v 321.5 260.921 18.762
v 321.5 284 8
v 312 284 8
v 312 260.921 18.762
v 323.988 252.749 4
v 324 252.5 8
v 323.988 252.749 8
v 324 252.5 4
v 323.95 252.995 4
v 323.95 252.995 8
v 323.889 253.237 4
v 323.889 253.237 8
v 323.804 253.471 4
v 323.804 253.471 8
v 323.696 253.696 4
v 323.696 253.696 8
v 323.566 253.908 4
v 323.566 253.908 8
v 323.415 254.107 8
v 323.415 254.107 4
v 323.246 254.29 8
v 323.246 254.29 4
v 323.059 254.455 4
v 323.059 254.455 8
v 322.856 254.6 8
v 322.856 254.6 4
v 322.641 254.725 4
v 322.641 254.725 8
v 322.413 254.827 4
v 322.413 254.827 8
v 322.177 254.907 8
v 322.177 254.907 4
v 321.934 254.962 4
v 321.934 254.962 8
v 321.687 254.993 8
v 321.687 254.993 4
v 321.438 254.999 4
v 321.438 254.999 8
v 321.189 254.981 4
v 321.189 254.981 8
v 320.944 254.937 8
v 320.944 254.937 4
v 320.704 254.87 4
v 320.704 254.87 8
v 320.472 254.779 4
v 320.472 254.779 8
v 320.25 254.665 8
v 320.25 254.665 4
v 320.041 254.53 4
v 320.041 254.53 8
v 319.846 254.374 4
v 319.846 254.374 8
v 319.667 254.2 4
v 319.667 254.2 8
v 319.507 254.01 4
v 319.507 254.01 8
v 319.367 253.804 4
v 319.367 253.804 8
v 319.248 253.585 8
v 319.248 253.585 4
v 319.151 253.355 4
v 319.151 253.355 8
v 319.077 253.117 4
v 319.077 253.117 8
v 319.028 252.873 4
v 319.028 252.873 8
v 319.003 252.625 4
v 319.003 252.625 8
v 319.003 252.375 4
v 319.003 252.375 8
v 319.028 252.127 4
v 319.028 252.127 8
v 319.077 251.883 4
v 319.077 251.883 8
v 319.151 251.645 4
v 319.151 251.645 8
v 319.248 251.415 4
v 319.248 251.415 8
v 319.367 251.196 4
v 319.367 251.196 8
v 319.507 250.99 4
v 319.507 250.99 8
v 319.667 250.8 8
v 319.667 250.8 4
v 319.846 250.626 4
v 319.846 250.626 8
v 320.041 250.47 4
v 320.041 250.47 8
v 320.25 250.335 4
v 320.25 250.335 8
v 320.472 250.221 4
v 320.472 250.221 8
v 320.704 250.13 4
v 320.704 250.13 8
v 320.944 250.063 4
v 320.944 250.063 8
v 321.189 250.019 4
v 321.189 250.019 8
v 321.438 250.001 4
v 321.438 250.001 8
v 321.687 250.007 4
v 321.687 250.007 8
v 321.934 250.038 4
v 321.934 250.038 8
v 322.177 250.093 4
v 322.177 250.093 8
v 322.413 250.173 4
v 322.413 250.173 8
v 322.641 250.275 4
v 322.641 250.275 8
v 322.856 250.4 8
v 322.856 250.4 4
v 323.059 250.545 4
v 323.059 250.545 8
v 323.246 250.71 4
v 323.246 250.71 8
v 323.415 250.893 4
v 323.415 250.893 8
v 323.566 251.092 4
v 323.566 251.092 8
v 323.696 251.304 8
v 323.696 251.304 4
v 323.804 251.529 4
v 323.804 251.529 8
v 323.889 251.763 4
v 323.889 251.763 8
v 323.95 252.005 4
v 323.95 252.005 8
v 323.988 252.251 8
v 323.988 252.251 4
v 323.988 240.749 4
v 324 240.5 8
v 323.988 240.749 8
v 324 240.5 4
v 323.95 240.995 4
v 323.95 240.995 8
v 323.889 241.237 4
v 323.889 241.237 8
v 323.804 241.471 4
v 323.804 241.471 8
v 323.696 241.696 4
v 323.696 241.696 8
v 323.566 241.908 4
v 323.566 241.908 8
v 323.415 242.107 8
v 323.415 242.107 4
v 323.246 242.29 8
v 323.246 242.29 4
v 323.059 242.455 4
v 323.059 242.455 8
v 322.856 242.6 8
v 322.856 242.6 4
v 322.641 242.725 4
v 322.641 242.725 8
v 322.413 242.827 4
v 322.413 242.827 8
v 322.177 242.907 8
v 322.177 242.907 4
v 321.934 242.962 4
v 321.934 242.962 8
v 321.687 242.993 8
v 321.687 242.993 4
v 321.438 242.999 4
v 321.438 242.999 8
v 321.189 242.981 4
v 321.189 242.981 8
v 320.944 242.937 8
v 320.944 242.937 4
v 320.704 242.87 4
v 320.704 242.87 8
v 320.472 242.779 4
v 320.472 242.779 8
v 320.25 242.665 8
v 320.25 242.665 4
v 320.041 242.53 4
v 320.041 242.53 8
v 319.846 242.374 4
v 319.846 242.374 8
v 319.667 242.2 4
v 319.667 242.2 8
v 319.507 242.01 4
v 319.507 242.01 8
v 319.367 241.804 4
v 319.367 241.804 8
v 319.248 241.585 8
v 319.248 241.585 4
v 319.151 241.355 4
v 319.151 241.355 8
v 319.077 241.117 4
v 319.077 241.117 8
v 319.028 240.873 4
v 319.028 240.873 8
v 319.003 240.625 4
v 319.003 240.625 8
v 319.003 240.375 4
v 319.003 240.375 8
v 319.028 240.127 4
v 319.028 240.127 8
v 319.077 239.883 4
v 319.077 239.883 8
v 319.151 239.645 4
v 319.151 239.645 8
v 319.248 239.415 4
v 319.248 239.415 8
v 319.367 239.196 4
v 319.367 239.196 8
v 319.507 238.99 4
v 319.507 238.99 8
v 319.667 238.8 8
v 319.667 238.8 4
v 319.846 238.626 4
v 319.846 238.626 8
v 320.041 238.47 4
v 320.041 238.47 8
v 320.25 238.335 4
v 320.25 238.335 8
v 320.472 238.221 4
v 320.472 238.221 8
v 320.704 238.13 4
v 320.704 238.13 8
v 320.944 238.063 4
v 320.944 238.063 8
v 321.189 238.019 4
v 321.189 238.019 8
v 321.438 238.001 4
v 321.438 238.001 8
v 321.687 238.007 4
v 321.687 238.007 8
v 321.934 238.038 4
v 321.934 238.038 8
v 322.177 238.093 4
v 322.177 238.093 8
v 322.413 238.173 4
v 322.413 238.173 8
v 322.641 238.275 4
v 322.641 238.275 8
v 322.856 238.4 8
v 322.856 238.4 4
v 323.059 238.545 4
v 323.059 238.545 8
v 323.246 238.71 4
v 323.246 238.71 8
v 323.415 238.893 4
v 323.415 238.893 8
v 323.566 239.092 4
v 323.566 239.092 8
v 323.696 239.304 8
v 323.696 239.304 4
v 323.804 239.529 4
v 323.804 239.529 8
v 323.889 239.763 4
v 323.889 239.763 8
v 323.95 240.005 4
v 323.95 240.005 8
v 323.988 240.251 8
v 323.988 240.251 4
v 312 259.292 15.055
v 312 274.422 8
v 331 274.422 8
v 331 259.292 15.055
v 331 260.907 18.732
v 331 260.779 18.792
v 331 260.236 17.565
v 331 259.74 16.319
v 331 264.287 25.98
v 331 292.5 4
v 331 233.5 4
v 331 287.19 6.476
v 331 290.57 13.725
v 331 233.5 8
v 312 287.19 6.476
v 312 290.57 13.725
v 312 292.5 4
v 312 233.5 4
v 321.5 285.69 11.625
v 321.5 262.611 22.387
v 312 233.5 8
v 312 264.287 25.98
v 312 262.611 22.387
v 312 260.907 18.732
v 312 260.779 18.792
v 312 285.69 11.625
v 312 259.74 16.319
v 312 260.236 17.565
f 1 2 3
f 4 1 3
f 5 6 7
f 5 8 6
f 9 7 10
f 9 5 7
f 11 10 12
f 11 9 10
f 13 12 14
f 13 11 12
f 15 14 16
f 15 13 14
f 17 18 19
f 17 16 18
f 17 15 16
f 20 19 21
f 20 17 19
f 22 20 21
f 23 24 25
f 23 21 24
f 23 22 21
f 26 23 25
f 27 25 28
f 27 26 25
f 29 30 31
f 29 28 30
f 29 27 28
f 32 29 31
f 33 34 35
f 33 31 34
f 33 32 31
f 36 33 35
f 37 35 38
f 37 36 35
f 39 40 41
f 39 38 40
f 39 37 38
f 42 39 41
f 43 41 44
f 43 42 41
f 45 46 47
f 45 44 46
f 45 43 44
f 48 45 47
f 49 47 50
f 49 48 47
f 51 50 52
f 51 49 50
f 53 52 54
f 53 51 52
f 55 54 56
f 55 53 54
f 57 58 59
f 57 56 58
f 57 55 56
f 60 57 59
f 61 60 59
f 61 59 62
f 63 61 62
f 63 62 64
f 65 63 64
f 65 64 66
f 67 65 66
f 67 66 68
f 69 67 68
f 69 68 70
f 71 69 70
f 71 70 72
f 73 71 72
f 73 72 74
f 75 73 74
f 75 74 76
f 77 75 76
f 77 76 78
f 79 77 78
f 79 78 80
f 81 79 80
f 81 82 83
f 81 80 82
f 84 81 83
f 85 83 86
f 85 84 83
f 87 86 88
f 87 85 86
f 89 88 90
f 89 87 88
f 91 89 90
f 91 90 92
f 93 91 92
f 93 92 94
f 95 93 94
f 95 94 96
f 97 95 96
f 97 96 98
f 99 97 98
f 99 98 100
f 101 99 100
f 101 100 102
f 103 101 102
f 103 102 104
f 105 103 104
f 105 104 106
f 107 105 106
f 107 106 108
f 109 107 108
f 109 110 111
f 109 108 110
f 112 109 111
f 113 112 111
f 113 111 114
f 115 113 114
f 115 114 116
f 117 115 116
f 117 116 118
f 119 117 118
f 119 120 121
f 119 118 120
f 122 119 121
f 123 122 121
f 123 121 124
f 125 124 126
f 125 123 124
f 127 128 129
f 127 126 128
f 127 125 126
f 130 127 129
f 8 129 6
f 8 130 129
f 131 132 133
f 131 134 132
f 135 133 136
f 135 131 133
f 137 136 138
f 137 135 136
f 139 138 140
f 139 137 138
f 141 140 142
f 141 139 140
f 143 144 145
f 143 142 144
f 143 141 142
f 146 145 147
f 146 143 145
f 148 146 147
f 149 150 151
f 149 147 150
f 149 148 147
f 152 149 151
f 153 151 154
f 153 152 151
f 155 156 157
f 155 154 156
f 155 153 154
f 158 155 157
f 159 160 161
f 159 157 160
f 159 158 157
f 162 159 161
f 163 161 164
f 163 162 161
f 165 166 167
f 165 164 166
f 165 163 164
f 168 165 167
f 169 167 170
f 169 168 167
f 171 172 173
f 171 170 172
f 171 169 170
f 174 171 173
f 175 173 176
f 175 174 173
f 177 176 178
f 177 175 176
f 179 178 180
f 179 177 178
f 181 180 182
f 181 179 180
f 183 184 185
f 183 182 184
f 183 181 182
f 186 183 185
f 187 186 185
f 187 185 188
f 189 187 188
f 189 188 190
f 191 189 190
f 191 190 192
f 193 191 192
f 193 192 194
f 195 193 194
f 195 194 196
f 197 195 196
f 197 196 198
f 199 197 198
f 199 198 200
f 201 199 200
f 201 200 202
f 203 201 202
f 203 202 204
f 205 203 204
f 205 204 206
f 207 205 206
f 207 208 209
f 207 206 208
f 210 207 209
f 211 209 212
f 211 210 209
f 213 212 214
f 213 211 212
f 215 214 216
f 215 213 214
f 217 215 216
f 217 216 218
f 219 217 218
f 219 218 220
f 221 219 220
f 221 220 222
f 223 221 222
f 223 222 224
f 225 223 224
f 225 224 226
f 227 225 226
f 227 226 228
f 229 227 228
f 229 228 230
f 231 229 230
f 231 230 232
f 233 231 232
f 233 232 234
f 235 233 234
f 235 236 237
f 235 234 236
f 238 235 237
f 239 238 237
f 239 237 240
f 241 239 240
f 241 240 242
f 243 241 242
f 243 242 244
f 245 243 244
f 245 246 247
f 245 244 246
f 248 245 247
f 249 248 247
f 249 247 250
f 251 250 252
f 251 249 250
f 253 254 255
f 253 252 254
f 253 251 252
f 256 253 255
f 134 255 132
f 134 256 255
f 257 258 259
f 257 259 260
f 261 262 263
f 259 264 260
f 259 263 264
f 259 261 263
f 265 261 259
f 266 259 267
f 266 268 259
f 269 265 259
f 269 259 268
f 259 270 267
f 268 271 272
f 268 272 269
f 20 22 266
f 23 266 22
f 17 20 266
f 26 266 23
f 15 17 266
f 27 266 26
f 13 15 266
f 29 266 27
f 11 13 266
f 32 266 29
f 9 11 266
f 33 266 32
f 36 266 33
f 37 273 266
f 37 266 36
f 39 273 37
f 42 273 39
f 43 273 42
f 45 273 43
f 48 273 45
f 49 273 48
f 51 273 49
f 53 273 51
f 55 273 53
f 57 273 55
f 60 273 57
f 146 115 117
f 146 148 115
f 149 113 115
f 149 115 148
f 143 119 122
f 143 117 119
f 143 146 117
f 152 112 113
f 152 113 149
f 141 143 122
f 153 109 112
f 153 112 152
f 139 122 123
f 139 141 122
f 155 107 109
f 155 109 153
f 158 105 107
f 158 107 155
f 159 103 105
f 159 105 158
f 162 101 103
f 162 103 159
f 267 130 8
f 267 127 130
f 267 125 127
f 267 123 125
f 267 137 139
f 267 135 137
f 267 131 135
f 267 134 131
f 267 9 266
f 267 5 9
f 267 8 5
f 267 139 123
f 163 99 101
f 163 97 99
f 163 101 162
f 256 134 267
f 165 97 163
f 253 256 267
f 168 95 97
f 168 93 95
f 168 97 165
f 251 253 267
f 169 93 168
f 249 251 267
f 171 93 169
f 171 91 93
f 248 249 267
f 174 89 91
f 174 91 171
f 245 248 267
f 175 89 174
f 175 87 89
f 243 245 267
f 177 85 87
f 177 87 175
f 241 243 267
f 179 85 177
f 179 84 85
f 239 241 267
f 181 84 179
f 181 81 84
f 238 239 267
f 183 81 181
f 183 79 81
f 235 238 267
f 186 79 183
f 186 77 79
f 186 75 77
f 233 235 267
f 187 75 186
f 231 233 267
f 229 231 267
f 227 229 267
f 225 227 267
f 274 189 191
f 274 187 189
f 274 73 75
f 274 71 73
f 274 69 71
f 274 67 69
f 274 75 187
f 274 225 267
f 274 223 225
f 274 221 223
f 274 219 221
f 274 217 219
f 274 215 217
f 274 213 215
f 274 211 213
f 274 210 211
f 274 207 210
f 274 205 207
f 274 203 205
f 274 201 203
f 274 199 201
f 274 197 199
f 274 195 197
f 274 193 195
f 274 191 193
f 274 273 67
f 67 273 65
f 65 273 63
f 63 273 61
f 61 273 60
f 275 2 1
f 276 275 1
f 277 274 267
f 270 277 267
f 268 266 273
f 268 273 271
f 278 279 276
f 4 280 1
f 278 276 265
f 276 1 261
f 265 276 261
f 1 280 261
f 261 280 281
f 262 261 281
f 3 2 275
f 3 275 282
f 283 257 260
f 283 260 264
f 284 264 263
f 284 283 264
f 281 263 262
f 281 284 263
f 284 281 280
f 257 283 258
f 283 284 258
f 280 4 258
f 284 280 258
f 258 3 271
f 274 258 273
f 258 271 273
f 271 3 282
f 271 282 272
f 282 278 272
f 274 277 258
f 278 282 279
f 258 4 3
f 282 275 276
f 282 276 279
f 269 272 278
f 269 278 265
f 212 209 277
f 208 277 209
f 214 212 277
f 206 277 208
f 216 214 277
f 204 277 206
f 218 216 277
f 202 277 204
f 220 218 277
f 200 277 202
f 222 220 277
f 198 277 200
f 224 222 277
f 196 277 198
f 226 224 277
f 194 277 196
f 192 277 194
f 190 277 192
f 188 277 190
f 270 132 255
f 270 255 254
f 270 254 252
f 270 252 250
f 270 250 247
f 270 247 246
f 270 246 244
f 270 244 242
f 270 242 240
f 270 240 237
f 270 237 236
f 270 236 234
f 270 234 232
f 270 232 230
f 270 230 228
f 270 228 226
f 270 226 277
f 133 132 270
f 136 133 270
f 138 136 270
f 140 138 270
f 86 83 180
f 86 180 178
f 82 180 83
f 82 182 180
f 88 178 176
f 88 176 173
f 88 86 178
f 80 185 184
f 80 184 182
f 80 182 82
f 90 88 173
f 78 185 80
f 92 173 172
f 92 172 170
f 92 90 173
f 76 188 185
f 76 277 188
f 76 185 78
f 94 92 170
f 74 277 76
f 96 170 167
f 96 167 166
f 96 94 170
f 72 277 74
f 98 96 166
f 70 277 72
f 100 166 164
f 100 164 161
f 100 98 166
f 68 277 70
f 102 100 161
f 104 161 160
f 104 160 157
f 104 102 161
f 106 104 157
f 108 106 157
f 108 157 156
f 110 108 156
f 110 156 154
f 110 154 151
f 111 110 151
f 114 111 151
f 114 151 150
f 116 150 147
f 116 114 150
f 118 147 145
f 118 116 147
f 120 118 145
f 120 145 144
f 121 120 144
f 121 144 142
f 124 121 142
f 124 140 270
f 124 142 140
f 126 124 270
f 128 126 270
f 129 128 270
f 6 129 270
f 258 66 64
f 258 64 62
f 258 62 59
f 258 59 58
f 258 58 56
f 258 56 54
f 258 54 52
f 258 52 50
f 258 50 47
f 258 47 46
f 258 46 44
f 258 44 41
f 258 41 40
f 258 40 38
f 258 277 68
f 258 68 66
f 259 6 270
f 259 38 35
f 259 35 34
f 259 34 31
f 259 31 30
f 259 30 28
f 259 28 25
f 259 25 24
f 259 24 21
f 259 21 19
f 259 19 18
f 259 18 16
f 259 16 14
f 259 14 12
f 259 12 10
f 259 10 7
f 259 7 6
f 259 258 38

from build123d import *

# Parameters (mm, degrees)
CYLINDER019_R          = 2.5
CYLINDER019_DEPTH      = 10
CYLINDER016_R          = 2.5
CYLINDER016_DEPTH      = 10
CYLINDER017_W          = 35
CYLINDER017_H          = 19
CYLINDER017_ANGLE      = 25
CYLINDER018_W          = 35
CYLINDER018_H          = 19
CYLINDER018_ANGLE      = 25
BOX028_W               = 19
BOX028_H               = 50
BOX028_DEPTH           = 4
BOX003_W               = 140
BOX003_H               = 162
BOX003_DEPTH           = 4
BOX003_ROLL_ANGLE      = 25.000043
BOX003_PLACEMENT_ANGLE = 180
BOX032_W               = 19
BOX032_H               = 29
BOX032_DEPTH           = 8
BOX032_PLACEMENT_ANGLE = 25


with BuildPart() as m4s003:
    # Cylinder019 → Cylinder019 (new body)
    with BuildSketch(Plane(origin=(177.5, 240.5, 0), x_dir=(1, 0, 0), z_dir=(0, 0, 1))):
        Circle(CYLINDER019_R)
    extrude(amount=CYLINDER019_DEPTH)


with BuildPart() as m4lowcut001:
    # Cylinder016 → Cylinder016 (new body)
    with BuildSketch(Plane(origin=(177.5, 252.5, 0), x_dir=(1, 0, 0), z_dir=(0, 0, 1))):
        Circle(CYLINDER016_R)
    extrude(amount=CYLINDER016_DEPTH)

    # Fusion010: union m4s003
    add(m4s003.part)


with BuildPart() as cylinder017:
    # Cylinder017 → Cylinder017 (revolve)
    with BuildSketch(Plane(origin=(187, 283, 4), x_dir=(0, -1, 0), z_dir=(0, 0, -1))):
        with Locations((17.5, 9.5)):
            Rectangle(CYLINDER017_W, CYLINDER017_H)
    revolve(axis=Axis((187, 283, 4), (-1, 0, 0)), revolution_arc=CYLINDER017_ANGLE)


with BuildPart() as bottom002:
    # Cylinder018 → Cylinder018 (revolve)
    with BuildSketch(Plane(origin=(187, 292.5, 4), x_dir=(0, -1, 0), z_dir=(0, 0, -1))):
        with Locations((17.5, 9.5)):
            Rectangle(CYLINDER018_W, CYLINDER018_H)
    revolve(axis=Axis((187, 292.5, 4), (-1, 0, 0)), revolution_arc=CYLINDER018_ANGLE)

    # Cut016: cut Cylinder017
    add(cylinder017.part, mode=Mode.SUBTRACT)


with BuildPart() as bottomright:
    # Box028 → Box028 (new body)
    with BuildSketch(Plane(origin=(168, 233.5, 4), x_dir=(1, 0, 0), z_dir=(0, 0, 1))):
        with Locations((9.5, 25)):
            Rectangle(BOX028_W, BOX028_H)
    extrude(amount=BOX028_DEPTH)

    # Fusion009: union bottom002
    add(bottom002.part)

    # Cut017: cut m4lowCut001
    add(m4lowcut001.part, mode=Mode.SUBTRACT)


with BuildPart() as bottomright_1:
    # Cut017 placement: moved
    add(bottomright.part.moved(Location((144, 0, 0))))


with BuildPart() as solar_panel002:
    # Box003 → Box003 (new body)
    with BuildSketch(Plane.XY):
        with Locations((70, 81)):
            Rectangle(BOX003_W, BOX003_H)
    extrude(amount=BOX003_DEPTH)


with BuildPart() as solar_panel002_1:
    # Box003 roll: moved
    add(solar_panel002.part.rotate(Axis((0, 0, 0), (1, 0, 0)), BOX003_ROLL_ANGLE))


with BuildPart() as solar_panel002_2:
    # Box003 placement: moved
    add(solar_panel002_1.part.moved(Location((321.5, 284, 8))).rotate(Axis((321.5, 284, 8), (0, 0, 1)), BOX003_PLACEMENT_ANGLE))


with BuildPart() as topright001:
    # Box032 → Box032 (new body)
    with BuildSketch(Plane.XY):
        with Locations((9.5, 14.5)):
            Rectangle(BOX032_W, BOX032_H)
    extrude(amount=BOX032_DEPTH)


with BuildPart() as topright001_1:
    # Box032 placement: moved
    add(topright001.part.moved(Location((312, 260.906, 18.73))).rotate(Axis((312, 260.906, 18.73), (-1, 0, 0)), BOX032_PLACEMENT_ANGLE))

    # Cut024: cut solar Panel002
    add(solar_panel002_2.part, mode=Mode.SUBTRACT)

    # Fusion028: union bottomRight
    add(bottomright_1.part)


solid = topright001_1.part
